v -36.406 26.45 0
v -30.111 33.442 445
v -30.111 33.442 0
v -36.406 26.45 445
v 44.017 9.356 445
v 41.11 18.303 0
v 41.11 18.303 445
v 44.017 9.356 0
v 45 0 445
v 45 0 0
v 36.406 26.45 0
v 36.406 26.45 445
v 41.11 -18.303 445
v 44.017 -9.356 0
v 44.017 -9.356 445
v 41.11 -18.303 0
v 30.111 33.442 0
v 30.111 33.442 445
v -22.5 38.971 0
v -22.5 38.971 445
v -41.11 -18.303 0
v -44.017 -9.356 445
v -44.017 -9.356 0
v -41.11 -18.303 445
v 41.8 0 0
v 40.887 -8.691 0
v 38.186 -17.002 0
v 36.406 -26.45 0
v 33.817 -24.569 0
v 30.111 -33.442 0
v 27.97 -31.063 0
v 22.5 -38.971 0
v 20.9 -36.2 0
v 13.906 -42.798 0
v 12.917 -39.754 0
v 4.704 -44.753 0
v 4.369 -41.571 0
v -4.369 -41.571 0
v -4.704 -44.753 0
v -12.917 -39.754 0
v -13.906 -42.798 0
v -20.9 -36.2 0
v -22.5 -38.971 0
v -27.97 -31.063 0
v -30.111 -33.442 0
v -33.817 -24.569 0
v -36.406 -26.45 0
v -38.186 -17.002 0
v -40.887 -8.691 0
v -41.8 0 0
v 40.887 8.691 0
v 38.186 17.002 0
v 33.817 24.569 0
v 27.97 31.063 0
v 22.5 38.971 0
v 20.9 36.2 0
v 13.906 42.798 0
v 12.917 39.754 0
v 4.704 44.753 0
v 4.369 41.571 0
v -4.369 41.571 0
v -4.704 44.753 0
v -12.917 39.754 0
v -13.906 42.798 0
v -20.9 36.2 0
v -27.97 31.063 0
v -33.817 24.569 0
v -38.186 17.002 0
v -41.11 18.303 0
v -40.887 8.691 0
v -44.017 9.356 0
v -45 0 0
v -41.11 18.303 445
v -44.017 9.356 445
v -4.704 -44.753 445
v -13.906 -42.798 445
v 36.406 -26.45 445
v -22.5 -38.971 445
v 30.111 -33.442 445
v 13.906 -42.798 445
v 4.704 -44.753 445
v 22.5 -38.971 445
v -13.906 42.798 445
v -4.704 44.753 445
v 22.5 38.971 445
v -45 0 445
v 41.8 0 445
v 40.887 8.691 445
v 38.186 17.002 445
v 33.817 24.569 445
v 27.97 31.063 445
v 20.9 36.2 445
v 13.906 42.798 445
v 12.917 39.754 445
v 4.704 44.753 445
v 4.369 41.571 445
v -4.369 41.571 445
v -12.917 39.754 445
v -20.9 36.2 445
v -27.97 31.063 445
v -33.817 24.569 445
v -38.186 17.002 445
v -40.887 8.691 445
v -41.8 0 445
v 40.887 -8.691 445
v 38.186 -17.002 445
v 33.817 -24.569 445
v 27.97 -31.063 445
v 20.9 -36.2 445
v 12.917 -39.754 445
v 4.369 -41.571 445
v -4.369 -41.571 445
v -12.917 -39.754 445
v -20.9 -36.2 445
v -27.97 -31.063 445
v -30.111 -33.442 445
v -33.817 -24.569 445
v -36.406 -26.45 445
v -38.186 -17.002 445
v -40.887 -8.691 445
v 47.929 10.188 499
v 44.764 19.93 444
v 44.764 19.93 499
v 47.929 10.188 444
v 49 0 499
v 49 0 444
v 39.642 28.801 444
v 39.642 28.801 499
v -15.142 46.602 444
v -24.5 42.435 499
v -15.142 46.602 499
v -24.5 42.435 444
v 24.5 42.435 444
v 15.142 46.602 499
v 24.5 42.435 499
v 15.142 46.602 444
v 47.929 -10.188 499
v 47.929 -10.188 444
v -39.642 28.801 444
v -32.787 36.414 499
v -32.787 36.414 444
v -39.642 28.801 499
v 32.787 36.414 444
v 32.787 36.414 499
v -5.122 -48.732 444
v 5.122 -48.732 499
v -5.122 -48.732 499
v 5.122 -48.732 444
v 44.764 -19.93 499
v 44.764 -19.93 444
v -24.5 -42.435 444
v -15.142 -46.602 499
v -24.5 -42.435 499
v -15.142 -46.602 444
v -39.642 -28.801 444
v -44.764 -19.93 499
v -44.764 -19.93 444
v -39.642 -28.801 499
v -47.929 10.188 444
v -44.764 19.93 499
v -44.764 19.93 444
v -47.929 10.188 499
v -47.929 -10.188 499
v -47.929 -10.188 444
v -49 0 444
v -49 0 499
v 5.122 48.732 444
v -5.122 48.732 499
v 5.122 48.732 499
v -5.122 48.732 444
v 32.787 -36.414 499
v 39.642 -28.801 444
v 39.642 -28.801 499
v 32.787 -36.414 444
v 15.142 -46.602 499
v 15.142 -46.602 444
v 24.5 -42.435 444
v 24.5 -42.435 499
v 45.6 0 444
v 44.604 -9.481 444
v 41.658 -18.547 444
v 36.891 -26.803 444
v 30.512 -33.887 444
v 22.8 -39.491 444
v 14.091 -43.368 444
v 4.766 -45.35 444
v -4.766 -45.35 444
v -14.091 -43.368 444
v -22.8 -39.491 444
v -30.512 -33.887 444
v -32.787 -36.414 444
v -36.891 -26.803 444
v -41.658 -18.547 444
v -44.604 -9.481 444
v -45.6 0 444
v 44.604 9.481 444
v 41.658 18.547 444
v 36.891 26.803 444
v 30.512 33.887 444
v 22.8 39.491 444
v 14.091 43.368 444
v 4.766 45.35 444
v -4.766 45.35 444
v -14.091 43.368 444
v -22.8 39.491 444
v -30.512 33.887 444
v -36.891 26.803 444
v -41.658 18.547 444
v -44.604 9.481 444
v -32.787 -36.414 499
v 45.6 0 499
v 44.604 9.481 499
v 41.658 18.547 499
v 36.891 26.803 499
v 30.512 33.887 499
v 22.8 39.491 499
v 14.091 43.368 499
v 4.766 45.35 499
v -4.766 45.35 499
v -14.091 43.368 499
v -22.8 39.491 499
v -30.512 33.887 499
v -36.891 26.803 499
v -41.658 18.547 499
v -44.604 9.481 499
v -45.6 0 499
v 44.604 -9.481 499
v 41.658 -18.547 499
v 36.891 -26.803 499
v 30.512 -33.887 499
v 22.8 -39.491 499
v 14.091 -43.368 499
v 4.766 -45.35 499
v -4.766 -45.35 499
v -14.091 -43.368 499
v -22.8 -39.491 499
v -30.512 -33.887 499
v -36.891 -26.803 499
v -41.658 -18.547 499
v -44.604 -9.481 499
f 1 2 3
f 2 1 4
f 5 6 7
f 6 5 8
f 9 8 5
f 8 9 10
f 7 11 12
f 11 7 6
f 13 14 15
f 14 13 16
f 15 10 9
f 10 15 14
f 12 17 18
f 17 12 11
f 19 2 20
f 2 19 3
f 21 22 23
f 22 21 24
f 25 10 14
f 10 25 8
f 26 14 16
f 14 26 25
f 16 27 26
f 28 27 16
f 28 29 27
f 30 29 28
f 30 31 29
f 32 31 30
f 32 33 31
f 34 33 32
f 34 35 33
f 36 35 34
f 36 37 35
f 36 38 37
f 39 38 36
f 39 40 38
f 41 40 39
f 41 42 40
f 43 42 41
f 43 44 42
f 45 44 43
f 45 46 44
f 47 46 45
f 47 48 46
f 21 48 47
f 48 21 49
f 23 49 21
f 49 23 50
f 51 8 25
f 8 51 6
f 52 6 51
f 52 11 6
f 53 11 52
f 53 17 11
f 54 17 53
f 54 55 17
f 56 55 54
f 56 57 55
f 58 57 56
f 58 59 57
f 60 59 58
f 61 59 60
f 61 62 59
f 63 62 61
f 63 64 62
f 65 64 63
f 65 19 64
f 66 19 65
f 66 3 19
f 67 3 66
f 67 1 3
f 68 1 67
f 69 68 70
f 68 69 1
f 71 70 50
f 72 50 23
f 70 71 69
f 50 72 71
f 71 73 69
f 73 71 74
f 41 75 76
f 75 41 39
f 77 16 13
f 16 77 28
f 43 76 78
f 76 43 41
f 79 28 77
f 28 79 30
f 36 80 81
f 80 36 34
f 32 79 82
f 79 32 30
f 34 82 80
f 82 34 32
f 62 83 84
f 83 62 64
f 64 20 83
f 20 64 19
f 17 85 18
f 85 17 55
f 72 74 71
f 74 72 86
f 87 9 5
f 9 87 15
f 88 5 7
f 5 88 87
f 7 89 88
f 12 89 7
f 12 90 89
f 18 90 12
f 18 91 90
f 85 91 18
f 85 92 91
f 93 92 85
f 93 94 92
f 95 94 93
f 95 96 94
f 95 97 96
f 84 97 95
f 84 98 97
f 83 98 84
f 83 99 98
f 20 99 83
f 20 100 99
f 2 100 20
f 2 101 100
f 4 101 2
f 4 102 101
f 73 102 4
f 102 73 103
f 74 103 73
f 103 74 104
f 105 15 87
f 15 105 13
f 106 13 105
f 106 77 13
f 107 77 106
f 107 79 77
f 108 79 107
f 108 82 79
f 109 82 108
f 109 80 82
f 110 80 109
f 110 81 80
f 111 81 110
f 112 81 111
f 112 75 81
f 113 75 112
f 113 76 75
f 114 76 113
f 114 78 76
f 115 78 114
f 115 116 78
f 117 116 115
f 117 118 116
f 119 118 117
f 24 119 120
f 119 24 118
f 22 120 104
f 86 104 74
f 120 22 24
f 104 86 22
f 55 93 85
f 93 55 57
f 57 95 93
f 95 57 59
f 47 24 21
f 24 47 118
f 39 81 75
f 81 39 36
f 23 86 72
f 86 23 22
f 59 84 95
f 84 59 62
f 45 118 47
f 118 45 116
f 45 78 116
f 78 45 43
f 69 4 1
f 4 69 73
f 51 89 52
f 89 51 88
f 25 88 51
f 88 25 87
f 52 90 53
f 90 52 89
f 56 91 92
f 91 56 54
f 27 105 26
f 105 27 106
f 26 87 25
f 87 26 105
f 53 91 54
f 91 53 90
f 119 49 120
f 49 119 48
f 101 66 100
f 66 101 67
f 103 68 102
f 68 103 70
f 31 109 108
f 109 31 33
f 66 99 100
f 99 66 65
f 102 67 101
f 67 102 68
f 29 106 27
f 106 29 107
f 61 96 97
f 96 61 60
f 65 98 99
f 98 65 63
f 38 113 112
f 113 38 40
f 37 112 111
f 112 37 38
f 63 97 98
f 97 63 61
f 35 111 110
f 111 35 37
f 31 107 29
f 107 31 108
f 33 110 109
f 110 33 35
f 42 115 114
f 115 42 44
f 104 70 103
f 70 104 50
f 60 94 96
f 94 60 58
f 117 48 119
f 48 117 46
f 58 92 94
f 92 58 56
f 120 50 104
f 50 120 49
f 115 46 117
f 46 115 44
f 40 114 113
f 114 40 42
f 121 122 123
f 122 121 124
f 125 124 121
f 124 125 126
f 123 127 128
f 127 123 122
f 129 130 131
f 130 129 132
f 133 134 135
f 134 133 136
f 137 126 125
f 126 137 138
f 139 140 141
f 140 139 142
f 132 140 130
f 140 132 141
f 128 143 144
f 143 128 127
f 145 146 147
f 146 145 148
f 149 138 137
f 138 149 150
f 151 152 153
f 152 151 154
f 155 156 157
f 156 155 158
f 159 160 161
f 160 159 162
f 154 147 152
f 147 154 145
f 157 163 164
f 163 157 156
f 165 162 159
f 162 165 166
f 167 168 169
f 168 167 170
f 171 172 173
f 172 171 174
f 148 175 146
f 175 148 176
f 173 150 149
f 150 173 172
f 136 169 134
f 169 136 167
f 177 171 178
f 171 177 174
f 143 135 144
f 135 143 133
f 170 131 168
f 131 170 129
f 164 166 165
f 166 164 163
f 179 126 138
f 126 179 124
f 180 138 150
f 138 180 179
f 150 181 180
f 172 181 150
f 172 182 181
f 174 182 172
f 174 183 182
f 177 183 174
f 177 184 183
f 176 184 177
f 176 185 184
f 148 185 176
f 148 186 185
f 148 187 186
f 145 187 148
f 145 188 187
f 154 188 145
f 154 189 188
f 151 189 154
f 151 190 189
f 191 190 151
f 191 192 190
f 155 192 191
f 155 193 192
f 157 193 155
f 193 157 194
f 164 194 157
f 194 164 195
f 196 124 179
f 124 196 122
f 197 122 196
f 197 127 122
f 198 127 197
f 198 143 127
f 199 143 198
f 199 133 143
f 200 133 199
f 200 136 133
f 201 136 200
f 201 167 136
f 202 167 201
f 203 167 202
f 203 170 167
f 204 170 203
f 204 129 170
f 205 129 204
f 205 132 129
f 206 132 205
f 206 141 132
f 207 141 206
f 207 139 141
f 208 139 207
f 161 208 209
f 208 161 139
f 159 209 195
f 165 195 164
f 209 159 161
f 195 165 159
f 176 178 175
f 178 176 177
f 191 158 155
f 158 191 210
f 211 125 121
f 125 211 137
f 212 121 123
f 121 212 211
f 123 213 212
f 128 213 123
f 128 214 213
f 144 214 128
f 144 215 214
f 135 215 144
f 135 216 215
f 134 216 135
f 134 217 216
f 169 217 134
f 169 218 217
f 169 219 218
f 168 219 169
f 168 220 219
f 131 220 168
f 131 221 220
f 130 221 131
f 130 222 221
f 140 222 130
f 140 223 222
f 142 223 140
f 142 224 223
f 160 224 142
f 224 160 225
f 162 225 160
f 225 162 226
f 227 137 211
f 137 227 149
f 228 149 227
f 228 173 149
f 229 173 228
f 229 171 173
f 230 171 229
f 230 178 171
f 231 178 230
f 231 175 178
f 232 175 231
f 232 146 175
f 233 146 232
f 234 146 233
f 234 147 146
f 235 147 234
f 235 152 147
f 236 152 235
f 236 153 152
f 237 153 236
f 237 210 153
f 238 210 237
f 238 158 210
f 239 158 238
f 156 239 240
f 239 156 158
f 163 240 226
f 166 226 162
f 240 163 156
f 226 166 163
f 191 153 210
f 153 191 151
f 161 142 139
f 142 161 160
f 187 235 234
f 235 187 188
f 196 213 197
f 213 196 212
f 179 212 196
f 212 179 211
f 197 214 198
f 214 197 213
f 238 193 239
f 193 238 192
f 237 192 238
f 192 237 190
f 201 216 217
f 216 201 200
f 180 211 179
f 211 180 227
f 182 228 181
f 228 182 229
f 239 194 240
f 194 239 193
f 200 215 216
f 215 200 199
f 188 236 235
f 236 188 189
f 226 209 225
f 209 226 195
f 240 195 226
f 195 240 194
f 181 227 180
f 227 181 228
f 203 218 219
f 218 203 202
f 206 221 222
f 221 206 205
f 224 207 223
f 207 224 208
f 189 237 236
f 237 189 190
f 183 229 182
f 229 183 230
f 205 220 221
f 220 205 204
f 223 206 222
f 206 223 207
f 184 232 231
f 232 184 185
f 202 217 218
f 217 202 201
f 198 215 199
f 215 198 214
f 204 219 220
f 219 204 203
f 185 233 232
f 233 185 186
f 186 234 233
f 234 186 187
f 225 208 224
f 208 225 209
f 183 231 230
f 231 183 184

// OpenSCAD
// Parameters
pipe_standard = 1; //[1:1:1]
nominal_diameter_mm = 90; //[45:180:1]
length_mm = 500; //[250:1000:1]
include_end_fitting = 1; //[0:1:1]
wall_thickness = 3.2; //[1.6:6.4:0.1]
fit_length = 55; //[30:110:1]
fit_od_extra = 8; //[3:16:0.5]
socket_clearance = 0.6; //[0.2:1.5:0.1]
socket_wall = 3.5; //[2:7:0.1]
stop_ring_thickness = 4; //[2:10:0.5]
stop_ring_radial = 2; //[1:5:0.5]
overlap = 1; //[0.5:2:0.1]

// HT Pipe - complete geometry
module ht_pipe() {
  color([0.85, 0.85, 0.8]) {
    // Pipe outer
    difference() {
      cylinder(r=nominal_diameter_mm/2, h=length_mm - (include_end_fitting*fit_length), center=false);
      // Pipe inner void
      translate([0, 0, -overlap/2])
        cylinder(r=nominal_diameter_mm/2 - wall_thickness, h=length_mm - (include_end_fitting*fit_length) + overlap, center=false);
    }
    
    // End fitting shell
    if (include_end_fitting) {
      difference() {
        translate([0, 0, length_mm - (include_end_fitting*fit_length) - overlap])
          cylinder(r=(nominal_diameter_mm + fit_od_extra)/2, h=include_end_fitting*fit_length, center=false);
        // Fitting socket void
        translate([0, 0, length_mm - (include_end_fitting*fit_length) - overlap])
          cylinder(r=nominal_diameter_mm/2 + socket_clearance, h=include_end_fitting*fit_length + overlap, center=false);
        // Fitting stop ring void
        translate([0, 0, length_mm - (include_end_fitting*fit_length) - overlap + include_end_fitting*(fit_length - stop_ring_thickness)])
          cylinder(r=nominal_diameter_mm/2 + socket_clearance - stop_ring_radial, h=include_end_fitting*stop_ring_thickness + overlap, center=false);
      }
    }
  }
}

// Assembly
module assembly() {
  ht_pipe();
}

assembly();
